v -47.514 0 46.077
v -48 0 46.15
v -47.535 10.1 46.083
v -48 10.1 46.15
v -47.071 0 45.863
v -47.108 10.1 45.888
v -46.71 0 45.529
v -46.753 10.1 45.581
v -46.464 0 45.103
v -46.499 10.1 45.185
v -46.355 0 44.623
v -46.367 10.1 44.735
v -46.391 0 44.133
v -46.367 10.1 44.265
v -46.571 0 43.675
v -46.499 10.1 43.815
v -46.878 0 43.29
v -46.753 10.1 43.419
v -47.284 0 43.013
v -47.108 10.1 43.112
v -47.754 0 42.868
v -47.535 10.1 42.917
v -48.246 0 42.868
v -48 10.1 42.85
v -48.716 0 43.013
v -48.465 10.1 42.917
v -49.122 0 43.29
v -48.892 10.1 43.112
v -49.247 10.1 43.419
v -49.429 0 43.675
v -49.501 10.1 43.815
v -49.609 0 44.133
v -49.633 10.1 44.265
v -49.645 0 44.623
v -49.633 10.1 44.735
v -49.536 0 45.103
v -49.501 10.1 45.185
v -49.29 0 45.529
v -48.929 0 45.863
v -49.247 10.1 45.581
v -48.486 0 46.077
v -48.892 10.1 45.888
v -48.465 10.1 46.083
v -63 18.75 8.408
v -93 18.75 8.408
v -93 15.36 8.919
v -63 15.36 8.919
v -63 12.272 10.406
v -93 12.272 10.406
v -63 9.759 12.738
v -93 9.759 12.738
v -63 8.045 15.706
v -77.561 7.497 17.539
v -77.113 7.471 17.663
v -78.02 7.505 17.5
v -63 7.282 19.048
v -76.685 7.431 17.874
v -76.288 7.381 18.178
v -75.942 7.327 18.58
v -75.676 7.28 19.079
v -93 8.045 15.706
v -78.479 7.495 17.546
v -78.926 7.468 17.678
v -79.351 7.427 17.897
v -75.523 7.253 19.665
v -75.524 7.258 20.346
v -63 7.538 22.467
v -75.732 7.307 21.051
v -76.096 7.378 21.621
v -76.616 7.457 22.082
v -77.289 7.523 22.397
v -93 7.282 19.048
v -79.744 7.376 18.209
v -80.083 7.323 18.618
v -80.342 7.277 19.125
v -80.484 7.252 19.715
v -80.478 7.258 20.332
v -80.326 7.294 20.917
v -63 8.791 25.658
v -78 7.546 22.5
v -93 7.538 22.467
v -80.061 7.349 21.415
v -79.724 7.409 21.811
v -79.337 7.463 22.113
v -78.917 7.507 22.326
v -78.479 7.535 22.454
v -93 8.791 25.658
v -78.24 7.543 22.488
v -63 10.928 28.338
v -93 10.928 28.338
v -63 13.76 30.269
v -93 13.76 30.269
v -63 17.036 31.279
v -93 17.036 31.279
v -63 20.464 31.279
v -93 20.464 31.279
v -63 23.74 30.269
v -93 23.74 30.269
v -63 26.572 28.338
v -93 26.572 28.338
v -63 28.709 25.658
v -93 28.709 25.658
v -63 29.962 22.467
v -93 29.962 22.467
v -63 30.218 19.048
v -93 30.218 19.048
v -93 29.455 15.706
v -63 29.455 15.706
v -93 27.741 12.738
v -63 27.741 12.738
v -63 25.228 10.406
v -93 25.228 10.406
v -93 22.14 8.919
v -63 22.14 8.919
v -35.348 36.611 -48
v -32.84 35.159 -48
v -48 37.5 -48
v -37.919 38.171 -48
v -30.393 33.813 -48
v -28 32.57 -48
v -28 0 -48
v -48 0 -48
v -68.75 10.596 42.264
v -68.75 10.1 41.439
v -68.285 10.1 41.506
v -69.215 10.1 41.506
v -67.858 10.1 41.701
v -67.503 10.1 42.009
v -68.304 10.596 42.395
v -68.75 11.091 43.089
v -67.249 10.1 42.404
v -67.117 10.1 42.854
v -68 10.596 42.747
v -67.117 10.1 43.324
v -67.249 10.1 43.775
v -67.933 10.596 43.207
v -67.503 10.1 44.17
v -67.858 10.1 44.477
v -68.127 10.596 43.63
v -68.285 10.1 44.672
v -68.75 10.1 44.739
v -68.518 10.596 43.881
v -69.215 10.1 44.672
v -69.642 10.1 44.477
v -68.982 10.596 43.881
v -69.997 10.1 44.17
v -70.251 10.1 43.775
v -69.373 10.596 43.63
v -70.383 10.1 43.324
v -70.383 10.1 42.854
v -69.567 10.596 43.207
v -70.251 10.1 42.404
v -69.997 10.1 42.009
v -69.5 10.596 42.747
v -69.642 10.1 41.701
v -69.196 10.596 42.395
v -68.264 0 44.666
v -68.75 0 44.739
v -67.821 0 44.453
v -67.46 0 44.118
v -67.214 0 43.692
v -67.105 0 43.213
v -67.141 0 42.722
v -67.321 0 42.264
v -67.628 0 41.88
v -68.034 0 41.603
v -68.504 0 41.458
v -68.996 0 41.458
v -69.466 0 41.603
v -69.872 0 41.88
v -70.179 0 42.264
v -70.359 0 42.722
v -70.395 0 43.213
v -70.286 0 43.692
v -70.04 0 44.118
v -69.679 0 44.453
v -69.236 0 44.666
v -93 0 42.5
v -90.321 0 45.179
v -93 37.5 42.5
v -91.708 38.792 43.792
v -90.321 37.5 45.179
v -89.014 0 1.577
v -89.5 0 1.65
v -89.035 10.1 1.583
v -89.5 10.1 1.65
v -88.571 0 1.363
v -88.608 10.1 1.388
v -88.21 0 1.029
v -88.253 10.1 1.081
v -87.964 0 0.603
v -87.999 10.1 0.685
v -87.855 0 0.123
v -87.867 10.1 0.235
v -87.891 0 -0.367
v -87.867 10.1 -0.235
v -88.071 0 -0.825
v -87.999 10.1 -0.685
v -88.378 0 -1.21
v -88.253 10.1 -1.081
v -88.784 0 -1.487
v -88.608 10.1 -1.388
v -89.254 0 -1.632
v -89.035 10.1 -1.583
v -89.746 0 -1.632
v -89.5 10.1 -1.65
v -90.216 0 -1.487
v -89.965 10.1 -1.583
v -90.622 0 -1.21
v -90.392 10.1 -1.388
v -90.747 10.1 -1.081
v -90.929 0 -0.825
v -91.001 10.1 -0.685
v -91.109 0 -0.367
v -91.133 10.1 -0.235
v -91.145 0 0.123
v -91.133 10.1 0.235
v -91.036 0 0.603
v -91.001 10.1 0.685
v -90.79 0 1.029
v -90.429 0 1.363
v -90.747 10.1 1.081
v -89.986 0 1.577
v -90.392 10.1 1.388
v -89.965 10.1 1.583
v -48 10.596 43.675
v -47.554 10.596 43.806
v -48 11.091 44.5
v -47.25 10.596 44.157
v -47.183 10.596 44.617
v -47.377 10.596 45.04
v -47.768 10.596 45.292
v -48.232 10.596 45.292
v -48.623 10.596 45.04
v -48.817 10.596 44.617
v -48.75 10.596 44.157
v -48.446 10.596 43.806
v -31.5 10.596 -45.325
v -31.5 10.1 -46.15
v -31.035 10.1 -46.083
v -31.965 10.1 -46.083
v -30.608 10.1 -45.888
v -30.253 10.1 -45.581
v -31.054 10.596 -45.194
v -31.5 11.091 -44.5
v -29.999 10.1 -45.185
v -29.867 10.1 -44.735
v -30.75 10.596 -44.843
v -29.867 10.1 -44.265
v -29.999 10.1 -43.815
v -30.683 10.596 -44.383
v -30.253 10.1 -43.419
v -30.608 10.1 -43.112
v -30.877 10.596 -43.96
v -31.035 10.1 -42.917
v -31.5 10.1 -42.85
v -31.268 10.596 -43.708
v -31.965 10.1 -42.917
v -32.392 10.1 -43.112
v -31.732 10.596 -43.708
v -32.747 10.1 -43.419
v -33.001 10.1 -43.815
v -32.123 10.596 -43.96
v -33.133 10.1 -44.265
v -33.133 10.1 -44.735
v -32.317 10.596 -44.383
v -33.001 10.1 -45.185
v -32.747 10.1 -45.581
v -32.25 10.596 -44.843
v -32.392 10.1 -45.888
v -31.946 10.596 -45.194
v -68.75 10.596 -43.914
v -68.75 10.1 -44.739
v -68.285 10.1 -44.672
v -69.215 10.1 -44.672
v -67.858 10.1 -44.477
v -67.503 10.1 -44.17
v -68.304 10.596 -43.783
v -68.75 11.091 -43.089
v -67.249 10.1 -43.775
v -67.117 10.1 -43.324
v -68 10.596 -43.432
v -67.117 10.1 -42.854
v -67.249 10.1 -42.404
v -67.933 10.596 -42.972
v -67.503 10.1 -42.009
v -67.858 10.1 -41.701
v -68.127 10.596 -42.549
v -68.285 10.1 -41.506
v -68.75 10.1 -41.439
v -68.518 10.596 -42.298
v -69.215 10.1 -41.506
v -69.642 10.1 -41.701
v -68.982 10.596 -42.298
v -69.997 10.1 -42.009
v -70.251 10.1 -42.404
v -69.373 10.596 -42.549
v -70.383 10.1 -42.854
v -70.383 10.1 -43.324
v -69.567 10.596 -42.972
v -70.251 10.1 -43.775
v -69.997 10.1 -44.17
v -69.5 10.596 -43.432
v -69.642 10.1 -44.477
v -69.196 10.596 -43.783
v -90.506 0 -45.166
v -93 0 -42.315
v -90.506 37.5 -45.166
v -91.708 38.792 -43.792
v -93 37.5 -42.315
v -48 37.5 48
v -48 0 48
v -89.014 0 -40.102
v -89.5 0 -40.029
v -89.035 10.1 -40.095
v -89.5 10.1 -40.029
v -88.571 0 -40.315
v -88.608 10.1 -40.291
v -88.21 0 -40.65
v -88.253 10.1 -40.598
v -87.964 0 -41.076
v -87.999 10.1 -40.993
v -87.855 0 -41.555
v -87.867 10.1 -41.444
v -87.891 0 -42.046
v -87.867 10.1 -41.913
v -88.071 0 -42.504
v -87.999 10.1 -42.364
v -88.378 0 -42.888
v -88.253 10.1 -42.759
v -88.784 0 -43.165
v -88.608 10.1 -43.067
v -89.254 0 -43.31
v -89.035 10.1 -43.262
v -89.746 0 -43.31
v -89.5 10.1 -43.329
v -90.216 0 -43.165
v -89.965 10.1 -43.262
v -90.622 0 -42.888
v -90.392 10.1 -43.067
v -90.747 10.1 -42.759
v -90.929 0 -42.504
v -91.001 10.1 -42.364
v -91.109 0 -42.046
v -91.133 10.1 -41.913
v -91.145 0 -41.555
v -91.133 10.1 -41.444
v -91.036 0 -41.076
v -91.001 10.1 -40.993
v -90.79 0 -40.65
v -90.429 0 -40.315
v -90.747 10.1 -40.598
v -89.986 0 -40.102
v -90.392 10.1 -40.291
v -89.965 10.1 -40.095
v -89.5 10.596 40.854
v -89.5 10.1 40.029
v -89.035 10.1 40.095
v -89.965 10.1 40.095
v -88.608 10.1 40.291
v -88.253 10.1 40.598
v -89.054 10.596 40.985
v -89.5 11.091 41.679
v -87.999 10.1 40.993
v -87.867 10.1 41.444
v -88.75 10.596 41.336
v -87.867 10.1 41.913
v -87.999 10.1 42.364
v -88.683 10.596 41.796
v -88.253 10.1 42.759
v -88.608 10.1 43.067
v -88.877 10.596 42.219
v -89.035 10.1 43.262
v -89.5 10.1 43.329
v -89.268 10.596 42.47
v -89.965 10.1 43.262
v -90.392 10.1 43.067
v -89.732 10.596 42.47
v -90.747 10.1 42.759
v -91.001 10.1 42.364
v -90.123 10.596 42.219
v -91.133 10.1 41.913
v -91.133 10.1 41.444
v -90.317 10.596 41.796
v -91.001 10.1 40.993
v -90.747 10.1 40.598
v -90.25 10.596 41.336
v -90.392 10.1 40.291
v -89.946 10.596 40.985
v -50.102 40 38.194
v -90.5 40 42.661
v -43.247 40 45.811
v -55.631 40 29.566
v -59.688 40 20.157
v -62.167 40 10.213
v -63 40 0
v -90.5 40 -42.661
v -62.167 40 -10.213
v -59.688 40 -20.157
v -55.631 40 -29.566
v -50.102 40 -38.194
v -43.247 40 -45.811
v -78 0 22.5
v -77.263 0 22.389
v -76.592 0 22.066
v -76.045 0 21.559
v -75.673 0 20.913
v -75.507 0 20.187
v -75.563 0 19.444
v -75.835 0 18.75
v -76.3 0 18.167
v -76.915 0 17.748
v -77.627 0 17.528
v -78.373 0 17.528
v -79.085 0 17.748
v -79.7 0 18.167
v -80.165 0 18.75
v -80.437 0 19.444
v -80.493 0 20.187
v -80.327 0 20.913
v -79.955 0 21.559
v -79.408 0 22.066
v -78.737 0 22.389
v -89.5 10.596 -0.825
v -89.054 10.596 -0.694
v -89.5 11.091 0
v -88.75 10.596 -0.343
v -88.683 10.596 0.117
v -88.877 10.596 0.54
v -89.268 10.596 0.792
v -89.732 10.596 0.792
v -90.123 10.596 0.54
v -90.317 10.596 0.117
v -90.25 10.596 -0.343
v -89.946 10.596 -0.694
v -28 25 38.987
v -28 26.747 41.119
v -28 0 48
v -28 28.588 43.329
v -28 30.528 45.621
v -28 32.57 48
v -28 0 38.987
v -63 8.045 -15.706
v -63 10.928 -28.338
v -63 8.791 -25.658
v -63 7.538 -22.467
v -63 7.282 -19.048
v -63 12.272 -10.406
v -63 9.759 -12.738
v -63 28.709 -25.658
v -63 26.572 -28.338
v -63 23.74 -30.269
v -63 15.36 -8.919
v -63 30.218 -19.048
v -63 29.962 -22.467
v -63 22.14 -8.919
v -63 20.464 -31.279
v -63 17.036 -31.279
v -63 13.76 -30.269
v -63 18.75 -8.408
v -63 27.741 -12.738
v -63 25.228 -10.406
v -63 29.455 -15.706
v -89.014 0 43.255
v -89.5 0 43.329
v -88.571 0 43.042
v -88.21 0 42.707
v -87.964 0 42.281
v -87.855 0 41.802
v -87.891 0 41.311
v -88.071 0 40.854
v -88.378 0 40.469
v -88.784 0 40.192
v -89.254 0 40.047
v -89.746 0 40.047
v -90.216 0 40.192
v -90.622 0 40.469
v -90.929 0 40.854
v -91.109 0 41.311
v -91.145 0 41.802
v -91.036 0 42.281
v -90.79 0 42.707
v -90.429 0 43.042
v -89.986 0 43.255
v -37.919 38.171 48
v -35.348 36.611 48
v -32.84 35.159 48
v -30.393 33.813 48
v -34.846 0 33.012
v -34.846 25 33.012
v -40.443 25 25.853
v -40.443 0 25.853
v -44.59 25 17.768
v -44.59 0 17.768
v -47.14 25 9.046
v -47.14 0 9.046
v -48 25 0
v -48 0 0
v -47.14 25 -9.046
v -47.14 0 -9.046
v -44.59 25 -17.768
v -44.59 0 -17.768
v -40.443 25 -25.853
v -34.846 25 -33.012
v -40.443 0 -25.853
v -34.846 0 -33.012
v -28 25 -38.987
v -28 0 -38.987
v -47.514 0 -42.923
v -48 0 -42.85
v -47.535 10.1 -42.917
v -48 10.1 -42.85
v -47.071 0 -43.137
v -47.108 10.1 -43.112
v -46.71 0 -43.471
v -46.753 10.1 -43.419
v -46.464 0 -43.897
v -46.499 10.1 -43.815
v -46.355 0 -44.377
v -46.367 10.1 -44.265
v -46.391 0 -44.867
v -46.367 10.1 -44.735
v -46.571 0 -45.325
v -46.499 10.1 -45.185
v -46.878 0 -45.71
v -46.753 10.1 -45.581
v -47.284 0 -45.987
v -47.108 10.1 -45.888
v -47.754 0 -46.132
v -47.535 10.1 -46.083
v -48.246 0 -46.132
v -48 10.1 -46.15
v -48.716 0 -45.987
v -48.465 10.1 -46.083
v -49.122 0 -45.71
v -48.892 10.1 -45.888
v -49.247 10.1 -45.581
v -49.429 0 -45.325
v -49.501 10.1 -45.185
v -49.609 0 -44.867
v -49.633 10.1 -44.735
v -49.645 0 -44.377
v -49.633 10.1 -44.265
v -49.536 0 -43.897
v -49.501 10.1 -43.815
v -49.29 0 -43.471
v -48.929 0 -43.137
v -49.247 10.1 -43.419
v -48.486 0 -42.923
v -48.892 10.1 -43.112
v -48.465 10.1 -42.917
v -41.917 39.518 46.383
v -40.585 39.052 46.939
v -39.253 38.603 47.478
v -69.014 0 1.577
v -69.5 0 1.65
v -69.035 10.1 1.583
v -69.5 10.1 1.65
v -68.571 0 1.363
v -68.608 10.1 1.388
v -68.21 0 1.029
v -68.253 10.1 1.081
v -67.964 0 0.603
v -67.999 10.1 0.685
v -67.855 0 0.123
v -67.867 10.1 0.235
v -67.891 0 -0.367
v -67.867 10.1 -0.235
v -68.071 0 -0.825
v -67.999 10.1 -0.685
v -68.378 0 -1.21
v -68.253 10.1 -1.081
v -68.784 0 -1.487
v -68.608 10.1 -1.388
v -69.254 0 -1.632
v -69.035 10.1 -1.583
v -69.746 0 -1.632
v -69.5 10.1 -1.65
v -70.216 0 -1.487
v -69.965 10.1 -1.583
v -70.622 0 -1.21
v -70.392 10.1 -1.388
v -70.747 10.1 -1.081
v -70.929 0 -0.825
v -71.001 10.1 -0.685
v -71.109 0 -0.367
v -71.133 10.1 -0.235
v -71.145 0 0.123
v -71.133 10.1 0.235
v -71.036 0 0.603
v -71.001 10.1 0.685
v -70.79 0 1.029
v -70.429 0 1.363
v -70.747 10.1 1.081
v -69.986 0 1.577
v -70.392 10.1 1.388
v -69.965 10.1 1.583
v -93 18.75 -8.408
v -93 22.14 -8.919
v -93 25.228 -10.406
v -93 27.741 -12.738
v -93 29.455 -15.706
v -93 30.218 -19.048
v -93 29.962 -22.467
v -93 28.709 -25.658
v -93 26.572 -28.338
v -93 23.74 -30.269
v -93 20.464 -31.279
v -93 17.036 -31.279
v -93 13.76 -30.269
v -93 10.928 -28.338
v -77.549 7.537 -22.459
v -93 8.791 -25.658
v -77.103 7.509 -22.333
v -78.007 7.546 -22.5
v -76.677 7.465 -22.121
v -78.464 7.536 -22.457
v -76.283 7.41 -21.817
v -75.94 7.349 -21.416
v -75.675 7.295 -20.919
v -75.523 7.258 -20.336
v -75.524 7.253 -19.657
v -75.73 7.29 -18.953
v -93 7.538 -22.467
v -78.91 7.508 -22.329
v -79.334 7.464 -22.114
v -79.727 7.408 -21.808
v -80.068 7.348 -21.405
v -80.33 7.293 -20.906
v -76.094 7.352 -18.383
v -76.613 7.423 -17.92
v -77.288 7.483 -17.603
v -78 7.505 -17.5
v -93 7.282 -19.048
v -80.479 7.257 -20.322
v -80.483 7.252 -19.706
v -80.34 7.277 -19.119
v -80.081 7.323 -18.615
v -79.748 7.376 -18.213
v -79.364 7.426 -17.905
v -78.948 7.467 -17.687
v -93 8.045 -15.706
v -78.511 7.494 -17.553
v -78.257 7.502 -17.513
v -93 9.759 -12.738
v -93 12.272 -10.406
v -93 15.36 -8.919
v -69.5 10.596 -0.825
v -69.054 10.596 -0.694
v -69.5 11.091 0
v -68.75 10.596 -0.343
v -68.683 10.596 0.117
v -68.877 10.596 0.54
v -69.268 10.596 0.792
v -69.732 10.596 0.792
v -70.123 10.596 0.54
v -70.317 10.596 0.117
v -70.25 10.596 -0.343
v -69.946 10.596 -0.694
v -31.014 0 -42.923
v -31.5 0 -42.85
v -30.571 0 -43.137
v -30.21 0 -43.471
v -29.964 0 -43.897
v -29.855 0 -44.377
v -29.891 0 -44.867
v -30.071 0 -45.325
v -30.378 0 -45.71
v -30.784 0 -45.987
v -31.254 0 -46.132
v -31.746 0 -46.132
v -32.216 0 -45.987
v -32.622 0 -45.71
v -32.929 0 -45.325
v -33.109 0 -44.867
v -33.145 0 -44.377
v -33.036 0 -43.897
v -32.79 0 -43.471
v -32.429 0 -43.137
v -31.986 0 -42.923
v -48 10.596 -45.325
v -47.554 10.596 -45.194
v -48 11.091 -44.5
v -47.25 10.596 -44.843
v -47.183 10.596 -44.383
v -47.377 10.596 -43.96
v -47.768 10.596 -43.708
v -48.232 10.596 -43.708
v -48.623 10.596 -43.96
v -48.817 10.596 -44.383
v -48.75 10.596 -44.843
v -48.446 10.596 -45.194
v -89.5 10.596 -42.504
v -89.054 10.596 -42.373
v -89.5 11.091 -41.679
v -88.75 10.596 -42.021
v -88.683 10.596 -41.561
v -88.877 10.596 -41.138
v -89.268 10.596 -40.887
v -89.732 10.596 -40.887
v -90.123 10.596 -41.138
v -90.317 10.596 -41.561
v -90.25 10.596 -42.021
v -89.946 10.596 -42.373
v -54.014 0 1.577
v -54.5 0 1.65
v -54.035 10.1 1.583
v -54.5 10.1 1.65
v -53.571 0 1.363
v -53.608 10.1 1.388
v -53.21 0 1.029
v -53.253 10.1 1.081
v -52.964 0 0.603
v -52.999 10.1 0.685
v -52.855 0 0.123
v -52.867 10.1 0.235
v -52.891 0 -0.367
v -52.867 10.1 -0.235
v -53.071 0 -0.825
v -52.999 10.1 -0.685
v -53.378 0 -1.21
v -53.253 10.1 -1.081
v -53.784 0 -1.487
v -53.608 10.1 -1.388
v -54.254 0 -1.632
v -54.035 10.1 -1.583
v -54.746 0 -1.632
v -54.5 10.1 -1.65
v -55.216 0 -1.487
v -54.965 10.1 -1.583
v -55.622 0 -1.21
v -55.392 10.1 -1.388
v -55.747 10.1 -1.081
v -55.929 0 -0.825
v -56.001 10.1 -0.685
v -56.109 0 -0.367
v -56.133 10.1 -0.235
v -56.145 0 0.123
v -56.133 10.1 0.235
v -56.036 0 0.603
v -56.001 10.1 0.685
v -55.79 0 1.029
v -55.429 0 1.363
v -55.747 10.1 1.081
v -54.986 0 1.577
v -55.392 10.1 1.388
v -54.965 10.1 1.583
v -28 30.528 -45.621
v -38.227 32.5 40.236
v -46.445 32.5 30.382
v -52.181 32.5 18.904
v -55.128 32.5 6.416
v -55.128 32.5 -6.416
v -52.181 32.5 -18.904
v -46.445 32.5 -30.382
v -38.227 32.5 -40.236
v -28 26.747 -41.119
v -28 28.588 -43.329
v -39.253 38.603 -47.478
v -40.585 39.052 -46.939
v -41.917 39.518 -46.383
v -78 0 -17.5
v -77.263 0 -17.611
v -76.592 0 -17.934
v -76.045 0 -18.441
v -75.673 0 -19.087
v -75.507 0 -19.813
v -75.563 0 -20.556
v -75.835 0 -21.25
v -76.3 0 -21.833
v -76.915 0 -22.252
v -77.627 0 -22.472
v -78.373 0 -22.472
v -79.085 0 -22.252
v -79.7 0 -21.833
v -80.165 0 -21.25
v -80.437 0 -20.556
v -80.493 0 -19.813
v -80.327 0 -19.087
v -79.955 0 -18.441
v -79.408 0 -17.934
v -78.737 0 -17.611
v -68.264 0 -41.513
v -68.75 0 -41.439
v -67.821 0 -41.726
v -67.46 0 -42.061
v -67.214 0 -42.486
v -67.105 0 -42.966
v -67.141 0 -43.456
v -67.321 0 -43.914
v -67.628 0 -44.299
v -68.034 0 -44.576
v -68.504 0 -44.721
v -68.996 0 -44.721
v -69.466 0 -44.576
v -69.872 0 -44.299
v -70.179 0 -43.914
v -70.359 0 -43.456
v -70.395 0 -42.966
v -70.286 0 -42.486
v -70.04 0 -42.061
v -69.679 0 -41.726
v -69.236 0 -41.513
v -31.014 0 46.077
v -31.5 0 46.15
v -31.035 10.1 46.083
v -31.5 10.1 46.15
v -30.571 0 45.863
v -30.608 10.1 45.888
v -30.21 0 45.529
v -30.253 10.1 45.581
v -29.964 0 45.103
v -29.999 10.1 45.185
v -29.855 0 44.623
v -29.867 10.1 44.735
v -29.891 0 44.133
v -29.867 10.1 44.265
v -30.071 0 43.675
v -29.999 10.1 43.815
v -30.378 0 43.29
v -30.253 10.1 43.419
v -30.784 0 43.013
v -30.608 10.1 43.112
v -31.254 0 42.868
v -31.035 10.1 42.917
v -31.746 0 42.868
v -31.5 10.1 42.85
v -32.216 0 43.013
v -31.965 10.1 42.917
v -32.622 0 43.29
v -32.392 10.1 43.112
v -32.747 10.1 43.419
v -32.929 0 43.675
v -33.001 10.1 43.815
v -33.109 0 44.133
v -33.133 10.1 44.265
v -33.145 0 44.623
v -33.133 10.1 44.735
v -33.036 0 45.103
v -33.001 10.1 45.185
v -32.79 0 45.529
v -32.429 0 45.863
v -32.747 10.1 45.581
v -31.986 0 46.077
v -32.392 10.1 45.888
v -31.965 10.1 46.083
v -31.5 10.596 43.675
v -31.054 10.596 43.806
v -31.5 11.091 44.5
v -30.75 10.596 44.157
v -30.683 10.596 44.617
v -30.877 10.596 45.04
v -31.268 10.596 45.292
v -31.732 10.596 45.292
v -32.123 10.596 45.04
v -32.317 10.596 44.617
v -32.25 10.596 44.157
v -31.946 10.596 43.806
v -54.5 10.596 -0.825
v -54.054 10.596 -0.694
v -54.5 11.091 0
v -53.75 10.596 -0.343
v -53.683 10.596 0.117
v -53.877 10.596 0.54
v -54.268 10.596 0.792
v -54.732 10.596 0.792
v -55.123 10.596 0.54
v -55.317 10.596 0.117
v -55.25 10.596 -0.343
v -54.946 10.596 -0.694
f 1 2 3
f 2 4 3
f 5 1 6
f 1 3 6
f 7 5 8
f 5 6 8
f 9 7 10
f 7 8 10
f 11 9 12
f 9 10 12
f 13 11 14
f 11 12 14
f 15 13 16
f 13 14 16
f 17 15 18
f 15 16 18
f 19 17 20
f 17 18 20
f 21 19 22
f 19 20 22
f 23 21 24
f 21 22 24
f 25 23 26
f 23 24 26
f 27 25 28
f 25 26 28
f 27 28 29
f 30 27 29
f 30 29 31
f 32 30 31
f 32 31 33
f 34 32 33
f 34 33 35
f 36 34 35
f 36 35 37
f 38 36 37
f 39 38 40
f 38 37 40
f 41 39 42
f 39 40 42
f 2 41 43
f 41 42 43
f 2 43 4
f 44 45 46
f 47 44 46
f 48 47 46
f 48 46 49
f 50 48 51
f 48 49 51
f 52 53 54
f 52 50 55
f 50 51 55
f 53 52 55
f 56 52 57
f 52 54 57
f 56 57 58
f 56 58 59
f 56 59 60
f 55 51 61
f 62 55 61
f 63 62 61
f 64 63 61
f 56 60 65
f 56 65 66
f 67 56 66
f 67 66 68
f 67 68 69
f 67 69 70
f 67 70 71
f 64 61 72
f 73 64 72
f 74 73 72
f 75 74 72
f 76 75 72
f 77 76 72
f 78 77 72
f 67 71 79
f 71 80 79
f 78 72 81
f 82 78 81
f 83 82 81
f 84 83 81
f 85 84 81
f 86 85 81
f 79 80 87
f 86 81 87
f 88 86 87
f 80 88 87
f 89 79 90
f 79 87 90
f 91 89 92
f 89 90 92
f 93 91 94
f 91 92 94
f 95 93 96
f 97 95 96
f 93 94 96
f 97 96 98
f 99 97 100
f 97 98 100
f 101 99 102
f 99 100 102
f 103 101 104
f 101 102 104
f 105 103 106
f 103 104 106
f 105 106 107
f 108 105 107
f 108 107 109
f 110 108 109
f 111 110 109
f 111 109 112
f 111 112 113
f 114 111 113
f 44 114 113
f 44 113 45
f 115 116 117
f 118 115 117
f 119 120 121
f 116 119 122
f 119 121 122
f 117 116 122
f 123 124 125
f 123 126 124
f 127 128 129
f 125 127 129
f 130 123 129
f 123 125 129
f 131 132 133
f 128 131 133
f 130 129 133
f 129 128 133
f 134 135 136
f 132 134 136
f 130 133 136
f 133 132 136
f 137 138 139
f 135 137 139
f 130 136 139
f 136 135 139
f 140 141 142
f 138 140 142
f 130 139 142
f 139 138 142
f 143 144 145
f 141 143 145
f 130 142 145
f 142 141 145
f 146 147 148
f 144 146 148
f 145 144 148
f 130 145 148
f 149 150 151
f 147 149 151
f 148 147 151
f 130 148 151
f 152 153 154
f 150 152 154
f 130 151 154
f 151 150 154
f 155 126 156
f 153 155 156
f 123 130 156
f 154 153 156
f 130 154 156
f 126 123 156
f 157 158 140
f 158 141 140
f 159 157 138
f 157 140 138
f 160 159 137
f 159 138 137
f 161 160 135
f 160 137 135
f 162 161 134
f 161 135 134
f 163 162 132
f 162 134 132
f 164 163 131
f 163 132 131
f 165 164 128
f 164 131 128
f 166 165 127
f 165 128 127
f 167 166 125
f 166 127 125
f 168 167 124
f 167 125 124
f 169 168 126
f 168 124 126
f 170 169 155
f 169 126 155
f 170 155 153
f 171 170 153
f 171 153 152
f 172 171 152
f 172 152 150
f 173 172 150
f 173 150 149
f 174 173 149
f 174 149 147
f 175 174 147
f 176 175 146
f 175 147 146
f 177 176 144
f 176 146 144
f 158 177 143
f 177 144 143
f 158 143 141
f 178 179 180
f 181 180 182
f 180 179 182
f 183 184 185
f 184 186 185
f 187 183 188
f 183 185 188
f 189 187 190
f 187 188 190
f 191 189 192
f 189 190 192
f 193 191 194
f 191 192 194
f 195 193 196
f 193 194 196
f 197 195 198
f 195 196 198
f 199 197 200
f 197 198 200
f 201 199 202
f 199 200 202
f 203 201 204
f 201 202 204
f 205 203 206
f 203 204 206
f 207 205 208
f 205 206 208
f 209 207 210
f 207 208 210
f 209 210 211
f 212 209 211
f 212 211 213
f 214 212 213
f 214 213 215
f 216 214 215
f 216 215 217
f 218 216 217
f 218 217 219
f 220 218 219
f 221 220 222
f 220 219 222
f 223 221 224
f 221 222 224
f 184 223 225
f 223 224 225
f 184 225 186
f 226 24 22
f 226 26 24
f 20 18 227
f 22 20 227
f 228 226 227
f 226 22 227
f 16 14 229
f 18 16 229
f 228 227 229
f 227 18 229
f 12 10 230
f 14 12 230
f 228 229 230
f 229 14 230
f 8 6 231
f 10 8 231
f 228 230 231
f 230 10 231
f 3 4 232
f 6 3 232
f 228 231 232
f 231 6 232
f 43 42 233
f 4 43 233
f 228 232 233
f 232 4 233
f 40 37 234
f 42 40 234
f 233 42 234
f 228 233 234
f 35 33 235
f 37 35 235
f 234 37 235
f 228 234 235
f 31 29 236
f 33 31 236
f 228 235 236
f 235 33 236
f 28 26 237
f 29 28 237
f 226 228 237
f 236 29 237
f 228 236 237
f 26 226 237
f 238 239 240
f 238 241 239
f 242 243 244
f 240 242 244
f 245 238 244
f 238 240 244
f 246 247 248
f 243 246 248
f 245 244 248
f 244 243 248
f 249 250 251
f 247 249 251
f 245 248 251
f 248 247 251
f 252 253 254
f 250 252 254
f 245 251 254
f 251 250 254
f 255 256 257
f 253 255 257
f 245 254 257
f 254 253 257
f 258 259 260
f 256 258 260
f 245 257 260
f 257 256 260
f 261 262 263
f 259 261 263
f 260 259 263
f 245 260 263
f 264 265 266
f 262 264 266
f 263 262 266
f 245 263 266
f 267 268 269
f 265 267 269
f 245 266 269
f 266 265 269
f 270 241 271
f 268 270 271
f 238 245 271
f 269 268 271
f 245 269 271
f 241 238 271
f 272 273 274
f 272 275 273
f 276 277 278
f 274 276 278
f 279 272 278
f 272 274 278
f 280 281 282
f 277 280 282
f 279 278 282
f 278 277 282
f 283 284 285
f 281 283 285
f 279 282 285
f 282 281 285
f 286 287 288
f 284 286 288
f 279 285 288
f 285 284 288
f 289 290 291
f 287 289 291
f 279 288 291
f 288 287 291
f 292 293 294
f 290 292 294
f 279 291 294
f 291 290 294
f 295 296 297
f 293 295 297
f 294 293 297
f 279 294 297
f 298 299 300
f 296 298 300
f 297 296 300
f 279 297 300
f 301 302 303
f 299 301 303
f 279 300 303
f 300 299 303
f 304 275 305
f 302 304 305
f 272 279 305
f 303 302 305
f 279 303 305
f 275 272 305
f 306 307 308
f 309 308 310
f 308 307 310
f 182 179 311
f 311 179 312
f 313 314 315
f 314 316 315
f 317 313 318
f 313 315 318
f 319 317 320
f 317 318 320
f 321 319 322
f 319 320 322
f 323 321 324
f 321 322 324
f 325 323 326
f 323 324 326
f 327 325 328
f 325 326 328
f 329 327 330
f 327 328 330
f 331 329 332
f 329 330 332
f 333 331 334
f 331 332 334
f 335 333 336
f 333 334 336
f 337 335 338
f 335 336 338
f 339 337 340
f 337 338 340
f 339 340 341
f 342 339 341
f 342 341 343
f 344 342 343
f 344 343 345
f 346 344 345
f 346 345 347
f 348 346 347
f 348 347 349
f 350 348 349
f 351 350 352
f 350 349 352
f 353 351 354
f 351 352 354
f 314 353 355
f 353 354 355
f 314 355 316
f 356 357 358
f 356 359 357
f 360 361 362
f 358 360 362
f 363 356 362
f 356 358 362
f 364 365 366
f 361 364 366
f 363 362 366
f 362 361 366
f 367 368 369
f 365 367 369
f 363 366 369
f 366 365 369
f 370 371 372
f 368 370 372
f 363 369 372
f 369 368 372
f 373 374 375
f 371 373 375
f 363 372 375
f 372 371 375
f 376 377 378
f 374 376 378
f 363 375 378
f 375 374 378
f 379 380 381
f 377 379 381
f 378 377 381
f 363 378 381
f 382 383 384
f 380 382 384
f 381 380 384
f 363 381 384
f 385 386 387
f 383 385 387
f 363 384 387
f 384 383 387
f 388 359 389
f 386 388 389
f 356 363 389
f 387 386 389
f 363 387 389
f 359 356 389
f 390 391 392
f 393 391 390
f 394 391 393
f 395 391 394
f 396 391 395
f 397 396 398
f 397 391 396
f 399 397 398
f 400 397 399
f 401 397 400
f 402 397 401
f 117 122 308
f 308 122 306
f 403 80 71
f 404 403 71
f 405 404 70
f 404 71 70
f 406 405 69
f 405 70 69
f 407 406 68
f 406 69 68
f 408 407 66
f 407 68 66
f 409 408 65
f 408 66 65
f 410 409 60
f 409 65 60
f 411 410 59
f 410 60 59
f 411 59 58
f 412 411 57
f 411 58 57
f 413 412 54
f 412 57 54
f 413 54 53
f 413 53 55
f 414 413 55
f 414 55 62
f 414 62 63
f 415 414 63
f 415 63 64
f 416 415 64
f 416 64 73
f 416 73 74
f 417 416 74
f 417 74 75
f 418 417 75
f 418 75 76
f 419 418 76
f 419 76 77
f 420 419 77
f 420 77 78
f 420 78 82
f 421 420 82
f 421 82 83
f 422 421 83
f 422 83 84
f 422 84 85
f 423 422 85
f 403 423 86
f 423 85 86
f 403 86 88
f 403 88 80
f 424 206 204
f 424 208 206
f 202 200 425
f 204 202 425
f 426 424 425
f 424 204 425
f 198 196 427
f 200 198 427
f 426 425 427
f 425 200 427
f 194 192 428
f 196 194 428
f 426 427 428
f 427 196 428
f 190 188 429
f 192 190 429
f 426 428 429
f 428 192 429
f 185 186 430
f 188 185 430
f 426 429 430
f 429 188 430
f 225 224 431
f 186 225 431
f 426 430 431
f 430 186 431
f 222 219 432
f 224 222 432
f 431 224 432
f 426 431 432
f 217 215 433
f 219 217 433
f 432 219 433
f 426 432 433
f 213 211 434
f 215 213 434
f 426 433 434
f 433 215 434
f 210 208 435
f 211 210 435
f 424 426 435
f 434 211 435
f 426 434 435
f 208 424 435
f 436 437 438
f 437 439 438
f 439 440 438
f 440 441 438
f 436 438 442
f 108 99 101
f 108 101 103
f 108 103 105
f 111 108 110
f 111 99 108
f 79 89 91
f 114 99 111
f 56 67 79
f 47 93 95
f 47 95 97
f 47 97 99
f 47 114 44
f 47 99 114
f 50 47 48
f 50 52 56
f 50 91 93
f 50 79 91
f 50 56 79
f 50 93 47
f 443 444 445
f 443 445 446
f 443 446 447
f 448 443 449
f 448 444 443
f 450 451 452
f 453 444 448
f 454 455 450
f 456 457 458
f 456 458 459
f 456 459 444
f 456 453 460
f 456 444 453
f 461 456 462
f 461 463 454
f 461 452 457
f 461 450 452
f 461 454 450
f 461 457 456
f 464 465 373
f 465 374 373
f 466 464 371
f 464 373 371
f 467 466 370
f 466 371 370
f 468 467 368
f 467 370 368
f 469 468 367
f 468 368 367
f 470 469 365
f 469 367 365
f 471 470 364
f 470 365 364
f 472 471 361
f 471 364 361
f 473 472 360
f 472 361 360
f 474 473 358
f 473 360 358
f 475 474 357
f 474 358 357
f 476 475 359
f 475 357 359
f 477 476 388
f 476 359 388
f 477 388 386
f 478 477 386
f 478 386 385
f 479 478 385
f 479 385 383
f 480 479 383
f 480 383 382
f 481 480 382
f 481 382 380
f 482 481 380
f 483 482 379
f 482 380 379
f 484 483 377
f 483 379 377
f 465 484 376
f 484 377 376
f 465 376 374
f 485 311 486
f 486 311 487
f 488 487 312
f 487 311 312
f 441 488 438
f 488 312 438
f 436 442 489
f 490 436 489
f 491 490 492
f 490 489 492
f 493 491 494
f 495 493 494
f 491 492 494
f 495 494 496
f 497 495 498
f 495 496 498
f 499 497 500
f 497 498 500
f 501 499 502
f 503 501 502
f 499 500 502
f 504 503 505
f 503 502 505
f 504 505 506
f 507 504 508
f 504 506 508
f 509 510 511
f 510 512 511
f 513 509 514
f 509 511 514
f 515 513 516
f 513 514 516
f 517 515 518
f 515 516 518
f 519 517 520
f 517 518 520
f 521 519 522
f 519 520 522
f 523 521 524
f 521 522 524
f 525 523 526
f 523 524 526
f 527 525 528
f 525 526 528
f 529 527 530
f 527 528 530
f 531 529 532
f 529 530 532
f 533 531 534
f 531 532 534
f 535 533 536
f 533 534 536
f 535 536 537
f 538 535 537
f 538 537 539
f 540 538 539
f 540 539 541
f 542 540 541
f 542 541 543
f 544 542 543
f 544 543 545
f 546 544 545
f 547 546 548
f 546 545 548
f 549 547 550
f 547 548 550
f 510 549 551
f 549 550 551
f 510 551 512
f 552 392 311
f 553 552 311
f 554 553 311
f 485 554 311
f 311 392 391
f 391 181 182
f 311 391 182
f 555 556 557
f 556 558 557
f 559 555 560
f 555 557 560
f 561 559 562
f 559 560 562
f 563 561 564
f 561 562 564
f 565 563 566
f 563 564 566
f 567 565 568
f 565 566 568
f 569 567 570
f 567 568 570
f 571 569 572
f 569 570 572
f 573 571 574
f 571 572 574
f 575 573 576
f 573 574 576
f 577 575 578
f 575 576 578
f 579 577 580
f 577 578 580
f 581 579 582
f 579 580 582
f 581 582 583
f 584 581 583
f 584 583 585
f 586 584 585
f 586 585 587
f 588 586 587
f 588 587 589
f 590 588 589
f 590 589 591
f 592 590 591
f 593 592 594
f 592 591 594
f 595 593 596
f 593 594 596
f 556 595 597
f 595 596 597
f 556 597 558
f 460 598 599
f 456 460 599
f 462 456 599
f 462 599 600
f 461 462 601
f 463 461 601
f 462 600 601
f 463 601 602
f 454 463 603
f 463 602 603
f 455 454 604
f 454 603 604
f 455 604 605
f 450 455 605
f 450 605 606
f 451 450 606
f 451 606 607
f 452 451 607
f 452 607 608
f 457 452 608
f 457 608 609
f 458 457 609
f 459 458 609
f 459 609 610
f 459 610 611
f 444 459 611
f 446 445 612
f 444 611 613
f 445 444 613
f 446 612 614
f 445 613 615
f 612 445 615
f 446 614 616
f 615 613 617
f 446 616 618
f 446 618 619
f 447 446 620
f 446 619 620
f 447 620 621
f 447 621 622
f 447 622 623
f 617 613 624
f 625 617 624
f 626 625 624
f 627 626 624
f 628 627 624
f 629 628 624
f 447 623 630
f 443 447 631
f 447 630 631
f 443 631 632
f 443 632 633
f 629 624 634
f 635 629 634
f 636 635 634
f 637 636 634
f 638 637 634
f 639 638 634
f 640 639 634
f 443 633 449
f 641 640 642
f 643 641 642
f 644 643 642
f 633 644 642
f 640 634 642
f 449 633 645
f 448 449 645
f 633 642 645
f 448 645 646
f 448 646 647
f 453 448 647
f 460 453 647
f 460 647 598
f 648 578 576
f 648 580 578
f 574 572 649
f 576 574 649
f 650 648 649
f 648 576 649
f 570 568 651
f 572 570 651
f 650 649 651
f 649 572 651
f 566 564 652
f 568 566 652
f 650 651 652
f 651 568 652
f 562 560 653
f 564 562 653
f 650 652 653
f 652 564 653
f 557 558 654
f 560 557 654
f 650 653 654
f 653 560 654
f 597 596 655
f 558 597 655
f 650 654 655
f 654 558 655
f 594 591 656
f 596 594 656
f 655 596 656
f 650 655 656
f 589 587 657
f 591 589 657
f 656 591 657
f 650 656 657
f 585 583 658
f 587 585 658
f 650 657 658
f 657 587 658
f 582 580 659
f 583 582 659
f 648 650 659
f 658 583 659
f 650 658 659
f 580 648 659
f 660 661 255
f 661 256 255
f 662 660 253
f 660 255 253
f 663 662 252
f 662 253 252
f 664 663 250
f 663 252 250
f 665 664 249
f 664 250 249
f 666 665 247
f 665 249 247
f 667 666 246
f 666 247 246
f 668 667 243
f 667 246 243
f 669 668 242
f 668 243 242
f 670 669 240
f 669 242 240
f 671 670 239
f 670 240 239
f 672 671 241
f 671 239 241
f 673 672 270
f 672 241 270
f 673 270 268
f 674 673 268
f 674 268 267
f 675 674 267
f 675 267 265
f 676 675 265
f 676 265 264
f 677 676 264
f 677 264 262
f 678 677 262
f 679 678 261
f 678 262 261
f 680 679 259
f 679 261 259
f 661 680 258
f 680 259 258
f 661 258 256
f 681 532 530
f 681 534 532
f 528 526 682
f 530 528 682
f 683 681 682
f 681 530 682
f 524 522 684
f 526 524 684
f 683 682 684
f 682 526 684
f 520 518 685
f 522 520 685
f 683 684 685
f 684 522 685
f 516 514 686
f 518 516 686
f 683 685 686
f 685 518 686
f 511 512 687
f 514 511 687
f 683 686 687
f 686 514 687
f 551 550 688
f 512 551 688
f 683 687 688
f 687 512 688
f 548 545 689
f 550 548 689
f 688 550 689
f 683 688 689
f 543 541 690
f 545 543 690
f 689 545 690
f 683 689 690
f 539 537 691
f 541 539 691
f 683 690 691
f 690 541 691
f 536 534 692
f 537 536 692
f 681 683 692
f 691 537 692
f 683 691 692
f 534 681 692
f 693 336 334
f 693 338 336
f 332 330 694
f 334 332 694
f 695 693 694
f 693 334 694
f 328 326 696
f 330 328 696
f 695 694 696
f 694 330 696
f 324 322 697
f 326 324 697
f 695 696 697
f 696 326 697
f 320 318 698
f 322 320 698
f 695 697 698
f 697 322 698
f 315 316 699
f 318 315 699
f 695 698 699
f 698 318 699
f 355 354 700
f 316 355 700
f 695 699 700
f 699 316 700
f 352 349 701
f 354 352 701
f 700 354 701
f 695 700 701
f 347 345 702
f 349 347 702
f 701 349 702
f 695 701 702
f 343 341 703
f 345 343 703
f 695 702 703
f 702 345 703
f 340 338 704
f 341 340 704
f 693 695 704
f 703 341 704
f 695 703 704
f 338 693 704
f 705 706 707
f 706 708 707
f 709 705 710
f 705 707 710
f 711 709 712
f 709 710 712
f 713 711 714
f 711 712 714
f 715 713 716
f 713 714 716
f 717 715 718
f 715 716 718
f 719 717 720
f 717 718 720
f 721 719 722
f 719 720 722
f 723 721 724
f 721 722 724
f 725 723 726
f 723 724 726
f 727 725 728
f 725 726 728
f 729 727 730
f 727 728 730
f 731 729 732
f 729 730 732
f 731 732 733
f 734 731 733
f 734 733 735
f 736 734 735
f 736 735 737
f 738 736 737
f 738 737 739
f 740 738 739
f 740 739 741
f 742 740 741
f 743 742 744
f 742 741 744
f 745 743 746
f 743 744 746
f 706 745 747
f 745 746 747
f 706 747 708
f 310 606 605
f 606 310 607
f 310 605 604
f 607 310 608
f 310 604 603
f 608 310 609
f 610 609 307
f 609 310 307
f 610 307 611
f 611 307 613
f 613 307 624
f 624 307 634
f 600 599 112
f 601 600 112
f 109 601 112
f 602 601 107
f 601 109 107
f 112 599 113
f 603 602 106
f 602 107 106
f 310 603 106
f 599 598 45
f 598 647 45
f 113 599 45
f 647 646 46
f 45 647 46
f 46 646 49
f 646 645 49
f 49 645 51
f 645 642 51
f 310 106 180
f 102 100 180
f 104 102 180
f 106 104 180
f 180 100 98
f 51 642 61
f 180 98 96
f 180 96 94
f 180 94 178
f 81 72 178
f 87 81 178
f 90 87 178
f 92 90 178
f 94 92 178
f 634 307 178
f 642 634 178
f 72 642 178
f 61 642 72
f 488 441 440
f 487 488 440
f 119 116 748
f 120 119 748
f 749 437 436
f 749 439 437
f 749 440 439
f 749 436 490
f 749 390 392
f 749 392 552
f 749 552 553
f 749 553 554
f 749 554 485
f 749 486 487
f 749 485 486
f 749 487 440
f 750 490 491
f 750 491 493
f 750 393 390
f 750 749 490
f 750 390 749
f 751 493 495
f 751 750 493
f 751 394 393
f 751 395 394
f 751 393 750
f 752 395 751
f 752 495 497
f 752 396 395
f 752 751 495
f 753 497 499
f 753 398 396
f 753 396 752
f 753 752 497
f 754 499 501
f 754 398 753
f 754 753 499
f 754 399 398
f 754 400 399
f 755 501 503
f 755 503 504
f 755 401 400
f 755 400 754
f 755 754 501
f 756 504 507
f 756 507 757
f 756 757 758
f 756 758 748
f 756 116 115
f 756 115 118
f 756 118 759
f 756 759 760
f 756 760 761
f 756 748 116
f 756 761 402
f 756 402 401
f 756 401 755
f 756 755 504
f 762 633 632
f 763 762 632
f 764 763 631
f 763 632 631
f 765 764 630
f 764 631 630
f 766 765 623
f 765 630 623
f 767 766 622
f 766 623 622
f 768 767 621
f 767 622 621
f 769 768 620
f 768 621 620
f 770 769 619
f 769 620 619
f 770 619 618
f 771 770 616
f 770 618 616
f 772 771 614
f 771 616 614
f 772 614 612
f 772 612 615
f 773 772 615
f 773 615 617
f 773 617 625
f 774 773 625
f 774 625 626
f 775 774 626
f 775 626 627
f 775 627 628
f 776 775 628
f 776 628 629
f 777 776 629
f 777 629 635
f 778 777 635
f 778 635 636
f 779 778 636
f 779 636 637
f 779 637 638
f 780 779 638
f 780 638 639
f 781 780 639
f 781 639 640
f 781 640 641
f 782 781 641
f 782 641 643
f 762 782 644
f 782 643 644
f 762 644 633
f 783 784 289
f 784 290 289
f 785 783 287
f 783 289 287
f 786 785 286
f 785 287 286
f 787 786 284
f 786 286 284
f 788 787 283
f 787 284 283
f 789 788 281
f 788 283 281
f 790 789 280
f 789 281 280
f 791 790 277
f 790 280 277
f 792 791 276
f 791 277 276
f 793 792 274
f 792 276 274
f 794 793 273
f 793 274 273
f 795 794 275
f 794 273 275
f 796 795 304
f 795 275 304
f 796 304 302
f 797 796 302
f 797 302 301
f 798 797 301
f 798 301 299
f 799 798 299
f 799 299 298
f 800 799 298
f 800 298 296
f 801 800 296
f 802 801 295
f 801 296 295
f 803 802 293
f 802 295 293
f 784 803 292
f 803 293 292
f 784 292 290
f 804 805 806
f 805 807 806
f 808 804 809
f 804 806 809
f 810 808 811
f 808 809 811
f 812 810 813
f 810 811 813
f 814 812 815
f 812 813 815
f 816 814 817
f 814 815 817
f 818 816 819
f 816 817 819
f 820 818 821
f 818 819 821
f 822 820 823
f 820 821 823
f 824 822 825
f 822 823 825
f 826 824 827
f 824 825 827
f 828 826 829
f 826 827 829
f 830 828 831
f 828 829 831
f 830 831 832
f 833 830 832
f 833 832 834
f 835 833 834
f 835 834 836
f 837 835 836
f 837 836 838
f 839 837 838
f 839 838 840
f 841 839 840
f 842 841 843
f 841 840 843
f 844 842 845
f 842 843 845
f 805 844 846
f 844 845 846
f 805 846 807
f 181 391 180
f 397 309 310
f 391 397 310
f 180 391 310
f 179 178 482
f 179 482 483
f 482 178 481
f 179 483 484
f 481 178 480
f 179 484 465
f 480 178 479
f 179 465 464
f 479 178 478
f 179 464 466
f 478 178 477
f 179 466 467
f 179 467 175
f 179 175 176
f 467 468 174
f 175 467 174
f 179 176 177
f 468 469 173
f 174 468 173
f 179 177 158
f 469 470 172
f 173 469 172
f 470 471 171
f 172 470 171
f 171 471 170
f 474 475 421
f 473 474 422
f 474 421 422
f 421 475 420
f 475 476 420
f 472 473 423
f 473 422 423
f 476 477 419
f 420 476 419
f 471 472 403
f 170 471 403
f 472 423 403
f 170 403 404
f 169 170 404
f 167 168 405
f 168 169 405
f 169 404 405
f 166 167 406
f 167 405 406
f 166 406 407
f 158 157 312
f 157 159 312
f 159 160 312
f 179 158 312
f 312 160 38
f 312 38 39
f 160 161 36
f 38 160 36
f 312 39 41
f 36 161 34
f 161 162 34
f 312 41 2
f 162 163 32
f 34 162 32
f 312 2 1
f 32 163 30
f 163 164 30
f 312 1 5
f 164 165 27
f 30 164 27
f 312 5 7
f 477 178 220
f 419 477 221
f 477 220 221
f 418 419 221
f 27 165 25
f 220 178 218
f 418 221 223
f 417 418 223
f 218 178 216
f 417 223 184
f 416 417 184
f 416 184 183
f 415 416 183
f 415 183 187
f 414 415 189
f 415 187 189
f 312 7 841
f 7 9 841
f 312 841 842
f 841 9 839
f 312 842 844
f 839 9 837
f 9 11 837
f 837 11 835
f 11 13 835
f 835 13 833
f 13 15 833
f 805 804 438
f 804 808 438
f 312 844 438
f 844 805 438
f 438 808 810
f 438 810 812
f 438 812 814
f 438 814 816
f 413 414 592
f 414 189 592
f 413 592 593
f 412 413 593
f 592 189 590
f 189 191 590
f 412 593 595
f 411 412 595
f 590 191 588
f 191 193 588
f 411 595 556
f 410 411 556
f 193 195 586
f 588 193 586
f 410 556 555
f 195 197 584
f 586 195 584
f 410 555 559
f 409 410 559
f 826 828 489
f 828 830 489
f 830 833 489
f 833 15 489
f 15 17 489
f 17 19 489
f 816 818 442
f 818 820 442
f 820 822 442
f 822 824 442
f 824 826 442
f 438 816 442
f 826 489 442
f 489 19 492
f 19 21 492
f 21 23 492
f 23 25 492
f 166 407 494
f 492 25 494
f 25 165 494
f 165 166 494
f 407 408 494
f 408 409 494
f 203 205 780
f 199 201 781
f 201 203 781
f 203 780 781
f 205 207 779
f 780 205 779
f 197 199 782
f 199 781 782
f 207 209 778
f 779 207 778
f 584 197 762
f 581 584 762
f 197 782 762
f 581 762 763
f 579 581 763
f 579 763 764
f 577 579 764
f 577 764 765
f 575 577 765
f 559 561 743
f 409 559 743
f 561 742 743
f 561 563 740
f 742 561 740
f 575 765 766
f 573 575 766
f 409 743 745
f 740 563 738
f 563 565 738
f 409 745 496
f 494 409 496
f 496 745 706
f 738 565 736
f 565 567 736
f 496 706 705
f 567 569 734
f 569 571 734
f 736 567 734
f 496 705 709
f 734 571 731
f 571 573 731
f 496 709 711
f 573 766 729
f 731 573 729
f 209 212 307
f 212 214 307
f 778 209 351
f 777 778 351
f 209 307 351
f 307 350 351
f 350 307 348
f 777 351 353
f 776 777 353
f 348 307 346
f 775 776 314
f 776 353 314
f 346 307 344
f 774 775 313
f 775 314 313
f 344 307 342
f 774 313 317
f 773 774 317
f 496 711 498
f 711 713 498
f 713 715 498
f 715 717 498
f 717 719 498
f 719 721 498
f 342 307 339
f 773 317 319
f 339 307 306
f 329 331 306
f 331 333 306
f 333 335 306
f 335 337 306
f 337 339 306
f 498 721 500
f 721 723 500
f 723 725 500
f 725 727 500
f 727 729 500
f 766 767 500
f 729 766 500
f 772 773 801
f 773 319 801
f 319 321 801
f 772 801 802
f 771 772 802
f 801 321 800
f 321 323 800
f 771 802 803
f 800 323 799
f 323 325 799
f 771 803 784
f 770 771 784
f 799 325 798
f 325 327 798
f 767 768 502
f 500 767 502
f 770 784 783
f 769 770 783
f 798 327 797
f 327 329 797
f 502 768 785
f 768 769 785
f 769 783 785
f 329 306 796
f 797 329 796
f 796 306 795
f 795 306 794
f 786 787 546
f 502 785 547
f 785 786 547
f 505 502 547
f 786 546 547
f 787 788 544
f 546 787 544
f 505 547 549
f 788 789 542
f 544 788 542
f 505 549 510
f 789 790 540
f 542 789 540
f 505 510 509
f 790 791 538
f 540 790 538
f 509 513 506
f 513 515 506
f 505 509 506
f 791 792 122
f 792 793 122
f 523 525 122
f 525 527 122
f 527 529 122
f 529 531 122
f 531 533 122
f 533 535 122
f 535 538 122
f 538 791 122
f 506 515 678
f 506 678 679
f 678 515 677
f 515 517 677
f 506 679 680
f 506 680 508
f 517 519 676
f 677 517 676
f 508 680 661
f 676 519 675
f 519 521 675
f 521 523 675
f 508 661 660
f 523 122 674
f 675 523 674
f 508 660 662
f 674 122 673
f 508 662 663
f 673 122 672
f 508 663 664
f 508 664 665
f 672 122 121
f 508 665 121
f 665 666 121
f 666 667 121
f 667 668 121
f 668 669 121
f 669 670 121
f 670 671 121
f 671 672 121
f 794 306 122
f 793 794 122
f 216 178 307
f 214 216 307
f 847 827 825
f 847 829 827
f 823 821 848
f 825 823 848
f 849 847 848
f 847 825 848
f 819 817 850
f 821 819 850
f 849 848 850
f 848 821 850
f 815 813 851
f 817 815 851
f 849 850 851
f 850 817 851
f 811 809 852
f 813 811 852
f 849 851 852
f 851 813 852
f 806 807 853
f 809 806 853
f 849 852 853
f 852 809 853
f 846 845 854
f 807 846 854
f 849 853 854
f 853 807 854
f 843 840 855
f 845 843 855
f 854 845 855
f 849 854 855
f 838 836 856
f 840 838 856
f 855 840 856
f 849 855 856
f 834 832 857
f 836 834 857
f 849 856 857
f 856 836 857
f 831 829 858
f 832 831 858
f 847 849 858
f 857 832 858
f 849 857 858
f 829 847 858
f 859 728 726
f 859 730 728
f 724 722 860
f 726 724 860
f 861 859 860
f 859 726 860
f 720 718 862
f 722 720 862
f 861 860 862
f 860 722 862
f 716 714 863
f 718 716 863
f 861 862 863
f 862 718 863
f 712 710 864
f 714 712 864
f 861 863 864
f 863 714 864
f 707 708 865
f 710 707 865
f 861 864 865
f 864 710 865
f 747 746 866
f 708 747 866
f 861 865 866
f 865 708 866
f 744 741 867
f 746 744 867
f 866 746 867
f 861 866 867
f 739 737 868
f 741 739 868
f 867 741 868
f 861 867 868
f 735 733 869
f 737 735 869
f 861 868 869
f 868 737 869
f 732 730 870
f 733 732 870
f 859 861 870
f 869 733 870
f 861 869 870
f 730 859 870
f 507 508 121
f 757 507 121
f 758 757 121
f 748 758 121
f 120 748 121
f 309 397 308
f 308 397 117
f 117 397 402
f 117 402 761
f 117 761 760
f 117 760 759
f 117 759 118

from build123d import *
from OCP.BRepFilletAPI import BRepFilletAPI_MakeChamfer

# Parameters (mm, degrees)
BOSS_EXTRUDE2_DEPTH       = 40
CHAMFER1_SIZE             = 15
CHAMFER3_SIZE             = 2.5
CHAMFER3_SIZE2            = 2.68451721
M4X0_7_TAPPED_HOLE1_D     = 3.3
M4X0_7_TAPPED_HOLE1_DEPTH = 10.1
M4X0_7_TAPPED_HOLE1_TIP   = 0.991420021
SKETCH4_R                 = 11.5
CUT_EXTRUDE1_DEPTH        = 30
M6X1_0_TAPPED_HOLE1_D     = 5
M6X1_0_TAPPED_HOLE1_DEPTH = 15
M6X1_0_TAPPED_HOLE1_TIP   = 1.502151548


with BuildPart() as part:
    # Sketch1 → Boss-Extrude2 (new body)
    with BuildSketch(Plane(origin=(0, 0, 0), x_dir=(1, 0, 0), z_dir=(0, 1, 0))):
        with BuildLine():
            Line((-28, 48), (-48, 48))
            Line((-48, 48), (-93, 45))
            Line((-93, 45), (-93, -45))
            Line((-93, -45), (-48, -48))
            Line((-48, -48), (-28, -48))
            Line((-28, -48), (-28, -38.987177379))
            ThreePointArc((-28, -38.987177379), (-48, 0), (-28, 38.987177379))
            Line((-28, 38.987177379), (-28, 48))
        make_face()
    extrude(amount=BOSS_EXTRUDE2_DEPTH)

    # Chamfer1
    chamfer1_edges = [part.edges().sort_by_distance(p)[0] for p in [
        (-48, 40, 0),
    ]]
    chamfer(chamfer1_edges, length=CHAMFER1_SIZE)

    # Chamfer2
    # the kernel refuses this chamfer: 2.5 mm, written as the material it takes off along each edge
    with BuildSketch(Plane(origin=(-32.604077303, 40, -49.026394846), x_dir=(0.06649386081081782, 0.027495876610587725, 0.9974079121622642), z_dir=(-0.997785157856609, 0, 0.06651901052377412)), Plane(origin=(-108.395922697, 40, 43.973605154), x_dir=(0.06649386081081746, 0.02749587661058773, -0.9974079121622642), z_dir=(0.997785157856609, 0, 0.06651901052377378))) as chamfer2_piece_1:
        with BuildLine():
            Line((2.571682988, 0), (-0.141367887, -2.567794484))
            Line((-0.141367887, -2.567794484), (-0.191348983, -2.56641969))
            ThreePointArc((-0.191348983, -2.56641969), (-0.085323068, -1.283494574), (-0.049981096, 0.001374794))
            Line((-0.049981096, 0.001374794), (0.001374794, 0.049981096))
            ThreePointArc((0.001374794, 0.049981096), (1.286244162, 0.014639124), (2.573057782, 0.049981096))
            Line((2.573057782, 0.049981096), (2.571682988, 0))
        make_face()
    extrude(amount=75.960084991, mode=Mode.SUBTRACT)
    with BuildSketch(Plane(origin=(-93, 40, -60.430097928), x_dir=(0.9996219169112968, 0.027495876610587663, 0), z_dir=(0, 0, 1))) as chamfer2_piece_2:
        with BuildLine():
            Line((2.571682988, 0), (-0.141367887, -2.567794484))
            Line((-0.141367887, -2.567794484), (-0.191348983, -2.56641969))
            ThreePointArc((-0.191348983, -2.56641969), (-0.085323068, -1.283494574), (-0.049981096, 0.001374794))
            Line((-0.049981096, 0.001374794), (0.001374794, 0.049981096))
            ThreePointArc((0.001374794, 0.049981096), (1.286244162, 0.014639124), (2.573057782, 0.049981096))
            Line((2.573057782, 0.049981096), (2.571682988, 0))
        make_face()
    extrude(amount=120.860195856, mode=Mode.SUBTRACT)

    # Chamfer3: one chamfer whose edges measure the first distance from different faces: ONE call of the kernel's chamfer builder (chamfer() names one face for all edges)
    chamfer3_edges_1 = [part.edges().sort_by_distance(p)[0] for p in [
        (-93, 18.75, -45),
    ]]
    chamfer3_side_1 = [part.faces().sort_by_distance(p)[0] for p in [
        (-70.5, 18.75, -46.5),
    ]]
    chamfer3_edges_2 = [part.edges().sort_by_distance(p)[0] for p in [
        (-93, 18.75, 45),
    ]]
    chamfer3_side_2 = [part.faces().sort_by_distance(p)[0] for p in [
        (-93, 18.75, 0),
    ]]
    chamfer3 = BRepFilletAPI_MakeChamfer(part.part.solid().wrapped)
    for e in chamfer3_edges_1:
        chamfer3.Add(CHAMFER3_SIZE, CHAMFER3_SIZE2, e.wrapped, chamfer3_side_1[0].wrapped)  # the first distance lies on this face
    for e in chamfer3_edges_2:
        chamfer3.Add(CHAMFER3_SIZE, CHAMFER3_SIZE2, e.wrapped, chamfer3_side_2[0].wrapped)  # the first distance lies on this face
    add(Compound.cast(chamfer3.Shape()), mode=Mode.REPLACE)

    # M4x0.7 Tapped Hole1
    with Locations(Plane(origin=(-89.5, 0, 41.678571429), x_dir=(0, 0, -1), z_dir=(0, -1, 0))):
        with Locations((0, 0), (-1.410714285, 20.75), (-2.821428571, 41.5), (-2.821428571, 58), (83.357142858, 0), (84.767857143, 20.75), (86.178571429, 41.5), (86.178571429, 58), (41.678571429, 0), (41.678571429, 20), (41.678571429, 35)):
            Hole(M4X0_7_TAPPED_HOLE1_D / 2, depth=M4X0_7_TAPPED_HOLE1_DEPTH)
            with Locations((0, 0, -(M4X0_7_TAPPED_HOLE1_DEPTH + M4X0_7_TAPPED_HOLE1_TIP / 2))):  # 118° drill point
                Cone(0, M4X0_7_TAPPED_HOLE1_D / 2, M4X0_7_TAPPED_HOLE1_TIP, mode=Mode.SUBTRACT)

    # Sketch4 → Cut-Extrude1 (cut)
    with BuildSketch(Plane.ZY.offset(93)):
        with Locations((-19.907741395, 18.75)):
            Circle(SKETCH4_R)
        with Locations(Location((19.907741395, 18.75, 0), (0, 0, 180))):
            Circle(SKETCH4_R)
    extrude(amount=-CUT_EXTRUDE1_DEPTH, mode=Mode.SUBTRACT)

    # M6x1.0 Tapped Hole1
    with Locations(Plane(origin=(-78, 0, 20), x_dir=(0, 0, -1), z_dir=(0, -1, 0))):
        with Locations((0, 0), (40, 0)):
            Hole(M6X1_0_TAPPED_HOLE1_D / 2, depth=M6X1_0_TAPPED_HOLE1_DEPTH)
            with Locations((0, 0, -(M6X1_0_TAPPED_HOLE1_DEPTH + M6X1_0_TAPPED_HOLE1_TIP / 2))):  # 118° drill point
                Cone(0, M6X1_0_TAPPED_HOLE1_D / 2, M6X1_0_TAPPED_HOLE1_TIP, mode=Mode.SUBTRACT)


solid = part.part
